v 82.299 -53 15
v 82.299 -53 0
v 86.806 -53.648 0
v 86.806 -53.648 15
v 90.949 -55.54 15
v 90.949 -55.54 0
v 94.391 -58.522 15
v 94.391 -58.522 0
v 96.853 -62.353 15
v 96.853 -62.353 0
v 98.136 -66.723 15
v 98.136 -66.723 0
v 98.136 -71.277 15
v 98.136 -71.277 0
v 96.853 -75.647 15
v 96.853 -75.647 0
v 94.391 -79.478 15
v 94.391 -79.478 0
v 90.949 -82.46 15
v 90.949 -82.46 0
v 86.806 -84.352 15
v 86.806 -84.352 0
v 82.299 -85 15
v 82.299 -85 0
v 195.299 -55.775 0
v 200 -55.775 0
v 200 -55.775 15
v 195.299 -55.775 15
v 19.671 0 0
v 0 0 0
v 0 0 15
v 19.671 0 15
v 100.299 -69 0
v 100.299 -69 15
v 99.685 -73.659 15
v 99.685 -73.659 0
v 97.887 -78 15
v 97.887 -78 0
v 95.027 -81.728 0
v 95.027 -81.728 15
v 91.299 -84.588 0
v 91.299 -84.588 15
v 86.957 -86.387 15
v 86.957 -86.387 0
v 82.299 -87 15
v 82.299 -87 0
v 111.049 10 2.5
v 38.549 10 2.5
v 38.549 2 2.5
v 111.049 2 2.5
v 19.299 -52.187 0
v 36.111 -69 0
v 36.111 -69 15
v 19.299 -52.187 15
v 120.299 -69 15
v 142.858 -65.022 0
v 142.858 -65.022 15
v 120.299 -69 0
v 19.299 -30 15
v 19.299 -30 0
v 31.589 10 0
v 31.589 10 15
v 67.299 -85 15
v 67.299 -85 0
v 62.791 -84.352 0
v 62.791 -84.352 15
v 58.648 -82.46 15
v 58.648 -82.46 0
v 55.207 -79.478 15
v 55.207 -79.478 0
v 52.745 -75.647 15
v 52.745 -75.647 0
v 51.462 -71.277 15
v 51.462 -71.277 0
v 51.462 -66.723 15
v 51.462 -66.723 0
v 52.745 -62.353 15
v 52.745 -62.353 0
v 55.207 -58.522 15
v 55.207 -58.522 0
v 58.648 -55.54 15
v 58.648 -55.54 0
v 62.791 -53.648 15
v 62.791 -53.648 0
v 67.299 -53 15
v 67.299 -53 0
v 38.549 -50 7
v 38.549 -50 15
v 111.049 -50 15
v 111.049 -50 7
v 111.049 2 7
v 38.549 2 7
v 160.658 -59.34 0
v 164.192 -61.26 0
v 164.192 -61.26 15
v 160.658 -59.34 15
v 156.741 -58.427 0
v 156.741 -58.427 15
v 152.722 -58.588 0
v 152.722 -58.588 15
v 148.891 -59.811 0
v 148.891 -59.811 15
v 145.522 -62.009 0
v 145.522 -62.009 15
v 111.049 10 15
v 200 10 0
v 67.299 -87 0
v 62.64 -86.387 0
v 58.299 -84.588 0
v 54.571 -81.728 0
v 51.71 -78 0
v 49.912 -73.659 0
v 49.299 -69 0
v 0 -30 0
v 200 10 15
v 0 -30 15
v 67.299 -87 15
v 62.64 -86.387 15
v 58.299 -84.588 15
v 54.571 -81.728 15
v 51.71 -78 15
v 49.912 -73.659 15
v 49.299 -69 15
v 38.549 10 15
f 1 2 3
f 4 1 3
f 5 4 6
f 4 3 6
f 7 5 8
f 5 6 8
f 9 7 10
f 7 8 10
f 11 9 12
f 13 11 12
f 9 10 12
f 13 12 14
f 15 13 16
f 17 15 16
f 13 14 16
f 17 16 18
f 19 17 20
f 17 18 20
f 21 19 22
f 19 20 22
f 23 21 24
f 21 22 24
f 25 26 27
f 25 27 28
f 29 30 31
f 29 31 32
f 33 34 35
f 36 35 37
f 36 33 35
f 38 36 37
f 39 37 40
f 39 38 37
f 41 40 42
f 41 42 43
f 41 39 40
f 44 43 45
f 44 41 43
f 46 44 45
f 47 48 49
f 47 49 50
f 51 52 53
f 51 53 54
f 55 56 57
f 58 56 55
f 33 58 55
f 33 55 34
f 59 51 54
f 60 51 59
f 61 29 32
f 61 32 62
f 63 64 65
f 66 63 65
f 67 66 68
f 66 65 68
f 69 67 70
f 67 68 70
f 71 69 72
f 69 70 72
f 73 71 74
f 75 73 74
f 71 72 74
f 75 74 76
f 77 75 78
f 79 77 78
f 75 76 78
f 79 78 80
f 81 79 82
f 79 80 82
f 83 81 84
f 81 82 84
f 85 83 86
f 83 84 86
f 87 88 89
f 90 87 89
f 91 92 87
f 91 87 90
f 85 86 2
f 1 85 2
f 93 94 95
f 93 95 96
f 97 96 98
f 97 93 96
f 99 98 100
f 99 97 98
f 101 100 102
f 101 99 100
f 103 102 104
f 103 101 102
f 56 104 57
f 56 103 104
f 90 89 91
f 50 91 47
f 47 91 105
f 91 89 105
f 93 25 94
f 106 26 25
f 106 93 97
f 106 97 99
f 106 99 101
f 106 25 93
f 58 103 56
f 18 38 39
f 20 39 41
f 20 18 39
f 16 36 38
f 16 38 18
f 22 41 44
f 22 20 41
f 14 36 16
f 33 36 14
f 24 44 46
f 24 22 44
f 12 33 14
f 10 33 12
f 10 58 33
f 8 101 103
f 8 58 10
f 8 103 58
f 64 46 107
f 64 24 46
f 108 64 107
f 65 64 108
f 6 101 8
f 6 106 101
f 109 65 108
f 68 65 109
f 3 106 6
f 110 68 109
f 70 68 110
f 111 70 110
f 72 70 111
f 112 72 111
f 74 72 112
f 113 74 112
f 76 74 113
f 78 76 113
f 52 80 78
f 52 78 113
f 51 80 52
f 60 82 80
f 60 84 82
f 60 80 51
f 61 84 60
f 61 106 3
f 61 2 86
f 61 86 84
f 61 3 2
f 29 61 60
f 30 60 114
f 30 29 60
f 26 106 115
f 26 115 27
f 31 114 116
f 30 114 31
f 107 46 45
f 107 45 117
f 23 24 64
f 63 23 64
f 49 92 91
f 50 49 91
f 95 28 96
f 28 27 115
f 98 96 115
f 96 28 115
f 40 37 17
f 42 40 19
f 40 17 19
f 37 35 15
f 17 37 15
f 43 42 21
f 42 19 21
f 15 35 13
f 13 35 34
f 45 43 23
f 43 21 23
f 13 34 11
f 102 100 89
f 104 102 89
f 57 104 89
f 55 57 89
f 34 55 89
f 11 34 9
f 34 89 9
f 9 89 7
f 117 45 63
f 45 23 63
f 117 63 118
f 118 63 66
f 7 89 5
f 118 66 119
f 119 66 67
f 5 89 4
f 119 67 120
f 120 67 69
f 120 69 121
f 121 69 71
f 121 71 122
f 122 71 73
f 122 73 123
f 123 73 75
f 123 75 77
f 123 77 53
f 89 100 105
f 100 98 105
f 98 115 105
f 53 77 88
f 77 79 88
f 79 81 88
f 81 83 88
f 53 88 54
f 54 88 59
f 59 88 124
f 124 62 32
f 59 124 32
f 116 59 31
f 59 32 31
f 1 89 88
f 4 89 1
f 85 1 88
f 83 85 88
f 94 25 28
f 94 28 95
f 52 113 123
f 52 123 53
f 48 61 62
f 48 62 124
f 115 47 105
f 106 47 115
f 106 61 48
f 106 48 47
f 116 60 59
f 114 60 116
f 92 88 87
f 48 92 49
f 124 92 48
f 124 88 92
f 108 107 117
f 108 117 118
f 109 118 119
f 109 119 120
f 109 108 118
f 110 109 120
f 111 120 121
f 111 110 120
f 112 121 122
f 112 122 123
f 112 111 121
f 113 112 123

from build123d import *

# Parameters (mm, degrees)
EXTRUDE_1_DEPTH     = 15
SKETCH_2_W          = 72.5
SKETCH_2_H          = 52
CUT_EXTRUDE_1_DEPTH = 8
SKETCH_3_W          = 72.5
SKETCH_3_H          = 8
CUT_EXTRUDE_4_DEPTH = 12.5


with BuildPart() as part:
    # 스케치1 → 보스-돌출1 (new body)
    with BuildSketch(Plane.XY):
        with BuildLine():
            Line((19.671242882, 0), (0, 0))
            Line((0, 0), (0, -30))
            Line((0, -30), (19.298724865, -30))
            Line((19.298724865, -30), (19.298724865, -52.187391743))
            Line((19.298724865, -52.187391743), (36.111333122, -69))
            Line((36.111333122, -69), (49.298724865, -69))
            ThreePointArc((49.298724865, -69), (54.570802804, -81.727922061), (67.298724865, -87))
            Line((67.298724865, -87), (82.298724865, -87))
            ThreePointArc((82.298724865, -87), (95.026646927, -81.727922061), (100.298724865, -69))
            Line((100.298724865, -69), (120.298724865, -69))
            Line((120.298724865, -69), (142.85786008, -65.0222158))
            ThreePointArc((142.85786008, -65.0222158), (152.722113491, -58.588242921), (164.192027956, -61.260426393))
            Line((164.192027956, -61.260426393), (195.298724865, -55.775476447))
            Line((195.298724865, -55.775476447), (200, -55.775476447))
            Line((200, -55.775476447), (200, 10))
            Line((200, 10), (31.588778808, 10))
            Line((31.588778808, 10), (19.671242882, 0))
        make_face()
        with BuildLine():
            ThreePointArc((67.298724865, -85), (51.298724865, -69), (67.298724865, -53))
            Line((67.298724865, -53), (82.298724865, -53))
            ThreePointArc((82.298724865, -53), (98.298724865, -69), (82.298724865, -85))
            Line((82.298724865, -85), (67.298724865, -85))
        make_face(mode=Mode.SUBTRACT)
    extrude(amount=EXTRUDE_1_DEPTH)

    # 스케치2 → 컷-돌출1 (cut)
    with BuildSketch(Plane.XY.offset(15)):
        with Locations((74.798724865, -24)):
            Rectangle(SKETCH_2_W, SKETCH_2_H)
    extrude(amount=-CUT_EXTRUDE_1_DEPTH, mode=Mode.SUBTRACT)

    # 스케치3 → 컷-돌출4 (cut)
    with BuildSketch(Plane.XY.offset(15)):
        with Locations((74.798724865, 6)):
            Rectangle(SKETCH_3_W, SKETCH_3_H)
    extrude(amount=-CUT_EXTRUDE_4_DEPTH, mode=Mode.SUBTRACT)


solid = part.part
